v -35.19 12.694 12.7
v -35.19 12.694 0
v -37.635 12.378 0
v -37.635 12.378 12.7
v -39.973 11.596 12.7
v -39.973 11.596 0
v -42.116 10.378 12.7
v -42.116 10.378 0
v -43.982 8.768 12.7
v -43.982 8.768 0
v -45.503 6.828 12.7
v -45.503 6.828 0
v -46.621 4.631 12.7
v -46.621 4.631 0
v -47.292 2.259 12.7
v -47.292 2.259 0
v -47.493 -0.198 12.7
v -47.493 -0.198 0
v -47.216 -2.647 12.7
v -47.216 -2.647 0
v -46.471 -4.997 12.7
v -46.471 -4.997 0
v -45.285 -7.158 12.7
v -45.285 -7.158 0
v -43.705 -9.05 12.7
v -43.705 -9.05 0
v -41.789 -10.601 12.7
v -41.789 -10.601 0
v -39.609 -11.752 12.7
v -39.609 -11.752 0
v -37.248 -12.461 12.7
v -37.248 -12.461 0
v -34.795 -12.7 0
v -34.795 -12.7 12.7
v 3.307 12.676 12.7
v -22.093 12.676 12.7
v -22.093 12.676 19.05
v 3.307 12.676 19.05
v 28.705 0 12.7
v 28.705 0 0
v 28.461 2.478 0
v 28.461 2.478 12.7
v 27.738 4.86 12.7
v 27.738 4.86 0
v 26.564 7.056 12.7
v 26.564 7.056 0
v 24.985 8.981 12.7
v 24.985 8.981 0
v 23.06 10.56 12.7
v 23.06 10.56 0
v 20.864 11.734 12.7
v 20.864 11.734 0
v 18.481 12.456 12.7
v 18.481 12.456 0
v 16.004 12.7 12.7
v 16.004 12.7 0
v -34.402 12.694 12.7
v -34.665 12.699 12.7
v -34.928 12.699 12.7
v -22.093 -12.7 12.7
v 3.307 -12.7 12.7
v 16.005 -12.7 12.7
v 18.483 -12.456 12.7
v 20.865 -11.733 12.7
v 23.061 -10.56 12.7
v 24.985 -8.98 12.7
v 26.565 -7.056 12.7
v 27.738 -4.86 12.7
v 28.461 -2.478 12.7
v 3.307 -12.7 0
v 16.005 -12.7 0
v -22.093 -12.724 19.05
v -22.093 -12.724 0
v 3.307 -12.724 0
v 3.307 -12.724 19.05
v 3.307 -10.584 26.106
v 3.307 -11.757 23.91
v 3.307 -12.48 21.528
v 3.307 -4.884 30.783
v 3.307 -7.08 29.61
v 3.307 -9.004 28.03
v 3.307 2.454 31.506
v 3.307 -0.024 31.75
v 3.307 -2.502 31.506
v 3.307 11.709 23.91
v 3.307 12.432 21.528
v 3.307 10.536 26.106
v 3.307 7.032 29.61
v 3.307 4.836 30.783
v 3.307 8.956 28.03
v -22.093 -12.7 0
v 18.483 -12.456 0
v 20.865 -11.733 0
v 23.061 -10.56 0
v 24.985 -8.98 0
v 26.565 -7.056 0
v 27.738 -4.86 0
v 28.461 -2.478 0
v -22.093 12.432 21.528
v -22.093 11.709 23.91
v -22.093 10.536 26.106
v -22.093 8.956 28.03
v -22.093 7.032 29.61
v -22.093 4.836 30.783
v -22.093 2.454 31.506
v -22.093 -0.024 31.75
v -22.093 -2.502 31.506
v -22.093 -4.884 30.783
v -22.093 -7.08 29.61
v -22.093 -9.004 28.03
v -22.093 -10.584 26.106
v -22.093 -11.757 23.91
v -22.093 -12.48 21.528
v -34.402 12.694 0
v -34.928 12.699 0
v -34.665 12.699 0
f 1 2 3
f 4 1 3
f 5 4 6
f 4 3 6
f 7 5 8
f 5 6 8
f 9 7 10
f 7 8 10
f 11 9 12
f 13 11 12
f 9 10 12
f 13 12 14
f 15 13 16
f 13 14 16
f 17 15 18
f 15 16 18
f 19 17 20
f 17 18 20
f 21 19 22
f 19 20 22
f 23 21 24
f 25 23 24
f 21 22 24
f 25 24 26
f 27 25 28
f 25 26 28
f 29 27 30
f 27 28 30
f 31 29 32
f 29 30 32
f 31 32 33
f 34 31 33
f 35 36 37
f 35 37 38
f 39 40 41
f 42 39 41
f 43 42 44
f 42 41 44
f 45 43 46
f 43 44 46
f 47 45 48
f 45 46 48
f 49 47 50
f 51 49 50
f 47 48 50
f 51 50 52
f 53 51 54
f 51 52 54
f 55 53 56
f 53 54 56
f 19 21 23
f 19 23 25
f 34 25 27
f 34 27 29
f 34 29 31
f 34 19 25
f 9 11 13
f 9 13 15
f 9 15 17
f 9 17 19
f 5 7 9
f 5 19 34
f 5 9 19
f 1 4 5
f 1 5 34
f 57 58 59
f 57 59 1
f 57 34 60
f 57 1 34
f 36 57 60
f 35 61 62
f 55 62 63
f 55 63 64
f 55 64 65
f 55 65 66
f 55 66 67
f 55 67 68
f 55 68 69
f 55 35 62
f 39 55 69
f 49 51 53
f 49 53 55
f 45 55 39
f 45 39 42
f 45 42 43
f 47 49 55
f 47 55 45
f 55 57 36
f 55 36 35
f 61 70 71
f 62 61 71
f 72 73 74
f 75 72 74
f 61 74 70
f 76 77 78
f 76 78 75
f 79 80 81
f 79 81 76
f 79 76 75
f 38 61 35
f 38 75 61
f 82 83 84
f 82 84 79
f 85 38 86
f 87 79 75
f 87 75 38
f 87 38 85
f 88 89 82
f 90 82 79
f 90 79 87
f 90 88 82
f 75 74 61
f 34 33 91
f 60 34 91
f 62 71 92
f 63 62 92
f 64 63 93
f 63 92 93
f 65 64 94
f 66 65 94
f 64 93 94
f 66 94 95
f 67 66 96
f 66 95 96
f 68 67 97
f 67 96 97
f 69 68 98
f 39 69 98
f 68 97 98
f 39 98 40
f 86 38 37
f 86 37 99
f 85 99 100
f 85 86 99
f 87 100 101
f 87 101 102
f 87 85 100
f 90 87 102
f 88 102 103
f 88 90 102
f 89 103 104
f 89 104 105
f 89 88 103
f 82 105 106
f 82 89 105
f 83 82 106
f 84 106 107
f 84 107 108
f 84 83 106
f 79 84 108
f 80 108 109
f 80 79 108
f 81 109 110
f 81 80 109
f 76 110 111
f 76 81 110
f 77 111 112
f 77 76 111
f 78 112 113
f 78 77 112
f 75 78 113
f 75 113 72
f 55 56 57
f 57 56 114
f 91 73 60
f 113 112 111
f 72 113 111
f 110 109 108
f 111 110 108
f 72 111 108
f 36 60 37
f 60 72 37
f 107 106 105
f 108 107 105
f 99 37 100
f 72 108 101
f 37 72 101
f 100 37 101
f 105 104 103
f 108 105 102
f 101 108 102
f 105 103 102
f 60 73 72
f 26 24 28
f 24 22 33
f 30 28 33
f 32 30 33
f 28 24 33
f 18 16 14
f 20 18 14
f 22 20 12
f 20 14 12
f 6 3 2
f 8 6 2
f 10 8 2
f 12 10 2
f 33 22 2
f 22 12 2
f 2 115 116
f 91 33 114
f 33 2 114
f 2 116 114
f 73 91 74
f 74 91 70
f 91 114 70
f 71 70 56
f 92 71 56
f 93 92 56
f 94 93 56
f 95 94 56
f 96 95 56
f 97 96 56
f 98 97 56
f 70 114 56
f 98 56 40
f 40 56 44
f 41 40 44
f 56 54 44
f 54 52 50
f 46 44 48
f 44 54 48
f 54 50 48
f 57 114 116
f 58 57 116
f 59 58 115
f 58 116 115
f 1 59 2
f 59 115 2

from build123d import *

# Parameters (mm, degrees)
F1_DEPTH = 12.7
F2_W     = 25.4
F2_H     = 25.4
F3_DEPTH = 19.05
F5_DEPTH = 25.4


with BuildPart() as f1:
    # F0 (on Top) → F1 (new body)
    with BuildSketch(Plane.XY):
        with BuildLine():
            Line((-34.4024921656, 12.6939360307), (-35.190372549, 12.6938412482))
            ThreePointArc((-35.190372549, 12.6938412482), (-47.493365494, -0.1977576135), (-34.7949052753, -12.7))
            ThreePointArc((-34.7949052753, -12.7), (-25.8146491543, -8.9802561211), (-22.0949052753, 0))
            ThreePointArc((-22.0949052753, 0), (-25.6769656371, 8.840428539), (-34.4024921656, 12.6939360307))
        make_face()
        with BuildLine():
            ThreePointArc((-34.4024921656, 12.6939360307), (-34.7964330925, 12.6999999081), (-35.190372549, 12.6938412482))
            Line((-35.190372549, 12.6938412482), (-34.4024921656, 12.6939360307))
        make_face()
        with BuildLine():
            ThreePointArc((-22.0949052753, 0), (-25.8146491543, -8.9802561211), (-34.7949052753, -12.7))
            Line((-34.7949052753, -12.7), (16.0050947247, -12.7))
            ThreePointArc((16.0050947247, -12.7), (3.3050947477, -0.0007639086), (16.0035669075, 12.6999999081))
            Line((16.0035669075, 12.6999999081), (-34.4024921656, 12.6939360307))
            ThreePointArc((-34.4024921656, 12.6939360307), (-25.6769656371, 8.840428539), (-22.0949052753, 0))
        make_face()
        with BuildLine():
            ThreePointArc((16.0035669075, 12.6999999081), (3.3050947477, -0.0007639086), (16.0050947247, -12.7))
            ThreePointArc((16.0050947247, -12.7), (24.9853508457, -8.9802561211), (28.7050947247, 0))
            ThreePointArc((28.7050947247, 0), (24.9848106646, 8.9807962698), (16.0035669075, 12.6999999081))
        make_face()
    extrude(amount=F1_DEPTH)

    # F2 (on Top) → F3 (join)
    with BuildSketch(Plane.XY):
        with Locations((-9.3933891925, -0.0239079818)):
            Rectangle(F2_W, F2_H)
    extrude(amount=F3_DEPTH)

    # F4 (on face) → F5 (join)
    with BuildSketch(Plane.YZ.offset(3.3066108075)):
        with BuildLine():
            Line((-12.7239079818, 19.05), (12.6760920182, 19.05))
            ThreePointArc((12.6760920182, 19.05), (-0.0239079818, 31.75), (-12.7239079818, 19.05))
        make_face()
    extrude(amount=-F5_DEPTH)


solid = f1.part
